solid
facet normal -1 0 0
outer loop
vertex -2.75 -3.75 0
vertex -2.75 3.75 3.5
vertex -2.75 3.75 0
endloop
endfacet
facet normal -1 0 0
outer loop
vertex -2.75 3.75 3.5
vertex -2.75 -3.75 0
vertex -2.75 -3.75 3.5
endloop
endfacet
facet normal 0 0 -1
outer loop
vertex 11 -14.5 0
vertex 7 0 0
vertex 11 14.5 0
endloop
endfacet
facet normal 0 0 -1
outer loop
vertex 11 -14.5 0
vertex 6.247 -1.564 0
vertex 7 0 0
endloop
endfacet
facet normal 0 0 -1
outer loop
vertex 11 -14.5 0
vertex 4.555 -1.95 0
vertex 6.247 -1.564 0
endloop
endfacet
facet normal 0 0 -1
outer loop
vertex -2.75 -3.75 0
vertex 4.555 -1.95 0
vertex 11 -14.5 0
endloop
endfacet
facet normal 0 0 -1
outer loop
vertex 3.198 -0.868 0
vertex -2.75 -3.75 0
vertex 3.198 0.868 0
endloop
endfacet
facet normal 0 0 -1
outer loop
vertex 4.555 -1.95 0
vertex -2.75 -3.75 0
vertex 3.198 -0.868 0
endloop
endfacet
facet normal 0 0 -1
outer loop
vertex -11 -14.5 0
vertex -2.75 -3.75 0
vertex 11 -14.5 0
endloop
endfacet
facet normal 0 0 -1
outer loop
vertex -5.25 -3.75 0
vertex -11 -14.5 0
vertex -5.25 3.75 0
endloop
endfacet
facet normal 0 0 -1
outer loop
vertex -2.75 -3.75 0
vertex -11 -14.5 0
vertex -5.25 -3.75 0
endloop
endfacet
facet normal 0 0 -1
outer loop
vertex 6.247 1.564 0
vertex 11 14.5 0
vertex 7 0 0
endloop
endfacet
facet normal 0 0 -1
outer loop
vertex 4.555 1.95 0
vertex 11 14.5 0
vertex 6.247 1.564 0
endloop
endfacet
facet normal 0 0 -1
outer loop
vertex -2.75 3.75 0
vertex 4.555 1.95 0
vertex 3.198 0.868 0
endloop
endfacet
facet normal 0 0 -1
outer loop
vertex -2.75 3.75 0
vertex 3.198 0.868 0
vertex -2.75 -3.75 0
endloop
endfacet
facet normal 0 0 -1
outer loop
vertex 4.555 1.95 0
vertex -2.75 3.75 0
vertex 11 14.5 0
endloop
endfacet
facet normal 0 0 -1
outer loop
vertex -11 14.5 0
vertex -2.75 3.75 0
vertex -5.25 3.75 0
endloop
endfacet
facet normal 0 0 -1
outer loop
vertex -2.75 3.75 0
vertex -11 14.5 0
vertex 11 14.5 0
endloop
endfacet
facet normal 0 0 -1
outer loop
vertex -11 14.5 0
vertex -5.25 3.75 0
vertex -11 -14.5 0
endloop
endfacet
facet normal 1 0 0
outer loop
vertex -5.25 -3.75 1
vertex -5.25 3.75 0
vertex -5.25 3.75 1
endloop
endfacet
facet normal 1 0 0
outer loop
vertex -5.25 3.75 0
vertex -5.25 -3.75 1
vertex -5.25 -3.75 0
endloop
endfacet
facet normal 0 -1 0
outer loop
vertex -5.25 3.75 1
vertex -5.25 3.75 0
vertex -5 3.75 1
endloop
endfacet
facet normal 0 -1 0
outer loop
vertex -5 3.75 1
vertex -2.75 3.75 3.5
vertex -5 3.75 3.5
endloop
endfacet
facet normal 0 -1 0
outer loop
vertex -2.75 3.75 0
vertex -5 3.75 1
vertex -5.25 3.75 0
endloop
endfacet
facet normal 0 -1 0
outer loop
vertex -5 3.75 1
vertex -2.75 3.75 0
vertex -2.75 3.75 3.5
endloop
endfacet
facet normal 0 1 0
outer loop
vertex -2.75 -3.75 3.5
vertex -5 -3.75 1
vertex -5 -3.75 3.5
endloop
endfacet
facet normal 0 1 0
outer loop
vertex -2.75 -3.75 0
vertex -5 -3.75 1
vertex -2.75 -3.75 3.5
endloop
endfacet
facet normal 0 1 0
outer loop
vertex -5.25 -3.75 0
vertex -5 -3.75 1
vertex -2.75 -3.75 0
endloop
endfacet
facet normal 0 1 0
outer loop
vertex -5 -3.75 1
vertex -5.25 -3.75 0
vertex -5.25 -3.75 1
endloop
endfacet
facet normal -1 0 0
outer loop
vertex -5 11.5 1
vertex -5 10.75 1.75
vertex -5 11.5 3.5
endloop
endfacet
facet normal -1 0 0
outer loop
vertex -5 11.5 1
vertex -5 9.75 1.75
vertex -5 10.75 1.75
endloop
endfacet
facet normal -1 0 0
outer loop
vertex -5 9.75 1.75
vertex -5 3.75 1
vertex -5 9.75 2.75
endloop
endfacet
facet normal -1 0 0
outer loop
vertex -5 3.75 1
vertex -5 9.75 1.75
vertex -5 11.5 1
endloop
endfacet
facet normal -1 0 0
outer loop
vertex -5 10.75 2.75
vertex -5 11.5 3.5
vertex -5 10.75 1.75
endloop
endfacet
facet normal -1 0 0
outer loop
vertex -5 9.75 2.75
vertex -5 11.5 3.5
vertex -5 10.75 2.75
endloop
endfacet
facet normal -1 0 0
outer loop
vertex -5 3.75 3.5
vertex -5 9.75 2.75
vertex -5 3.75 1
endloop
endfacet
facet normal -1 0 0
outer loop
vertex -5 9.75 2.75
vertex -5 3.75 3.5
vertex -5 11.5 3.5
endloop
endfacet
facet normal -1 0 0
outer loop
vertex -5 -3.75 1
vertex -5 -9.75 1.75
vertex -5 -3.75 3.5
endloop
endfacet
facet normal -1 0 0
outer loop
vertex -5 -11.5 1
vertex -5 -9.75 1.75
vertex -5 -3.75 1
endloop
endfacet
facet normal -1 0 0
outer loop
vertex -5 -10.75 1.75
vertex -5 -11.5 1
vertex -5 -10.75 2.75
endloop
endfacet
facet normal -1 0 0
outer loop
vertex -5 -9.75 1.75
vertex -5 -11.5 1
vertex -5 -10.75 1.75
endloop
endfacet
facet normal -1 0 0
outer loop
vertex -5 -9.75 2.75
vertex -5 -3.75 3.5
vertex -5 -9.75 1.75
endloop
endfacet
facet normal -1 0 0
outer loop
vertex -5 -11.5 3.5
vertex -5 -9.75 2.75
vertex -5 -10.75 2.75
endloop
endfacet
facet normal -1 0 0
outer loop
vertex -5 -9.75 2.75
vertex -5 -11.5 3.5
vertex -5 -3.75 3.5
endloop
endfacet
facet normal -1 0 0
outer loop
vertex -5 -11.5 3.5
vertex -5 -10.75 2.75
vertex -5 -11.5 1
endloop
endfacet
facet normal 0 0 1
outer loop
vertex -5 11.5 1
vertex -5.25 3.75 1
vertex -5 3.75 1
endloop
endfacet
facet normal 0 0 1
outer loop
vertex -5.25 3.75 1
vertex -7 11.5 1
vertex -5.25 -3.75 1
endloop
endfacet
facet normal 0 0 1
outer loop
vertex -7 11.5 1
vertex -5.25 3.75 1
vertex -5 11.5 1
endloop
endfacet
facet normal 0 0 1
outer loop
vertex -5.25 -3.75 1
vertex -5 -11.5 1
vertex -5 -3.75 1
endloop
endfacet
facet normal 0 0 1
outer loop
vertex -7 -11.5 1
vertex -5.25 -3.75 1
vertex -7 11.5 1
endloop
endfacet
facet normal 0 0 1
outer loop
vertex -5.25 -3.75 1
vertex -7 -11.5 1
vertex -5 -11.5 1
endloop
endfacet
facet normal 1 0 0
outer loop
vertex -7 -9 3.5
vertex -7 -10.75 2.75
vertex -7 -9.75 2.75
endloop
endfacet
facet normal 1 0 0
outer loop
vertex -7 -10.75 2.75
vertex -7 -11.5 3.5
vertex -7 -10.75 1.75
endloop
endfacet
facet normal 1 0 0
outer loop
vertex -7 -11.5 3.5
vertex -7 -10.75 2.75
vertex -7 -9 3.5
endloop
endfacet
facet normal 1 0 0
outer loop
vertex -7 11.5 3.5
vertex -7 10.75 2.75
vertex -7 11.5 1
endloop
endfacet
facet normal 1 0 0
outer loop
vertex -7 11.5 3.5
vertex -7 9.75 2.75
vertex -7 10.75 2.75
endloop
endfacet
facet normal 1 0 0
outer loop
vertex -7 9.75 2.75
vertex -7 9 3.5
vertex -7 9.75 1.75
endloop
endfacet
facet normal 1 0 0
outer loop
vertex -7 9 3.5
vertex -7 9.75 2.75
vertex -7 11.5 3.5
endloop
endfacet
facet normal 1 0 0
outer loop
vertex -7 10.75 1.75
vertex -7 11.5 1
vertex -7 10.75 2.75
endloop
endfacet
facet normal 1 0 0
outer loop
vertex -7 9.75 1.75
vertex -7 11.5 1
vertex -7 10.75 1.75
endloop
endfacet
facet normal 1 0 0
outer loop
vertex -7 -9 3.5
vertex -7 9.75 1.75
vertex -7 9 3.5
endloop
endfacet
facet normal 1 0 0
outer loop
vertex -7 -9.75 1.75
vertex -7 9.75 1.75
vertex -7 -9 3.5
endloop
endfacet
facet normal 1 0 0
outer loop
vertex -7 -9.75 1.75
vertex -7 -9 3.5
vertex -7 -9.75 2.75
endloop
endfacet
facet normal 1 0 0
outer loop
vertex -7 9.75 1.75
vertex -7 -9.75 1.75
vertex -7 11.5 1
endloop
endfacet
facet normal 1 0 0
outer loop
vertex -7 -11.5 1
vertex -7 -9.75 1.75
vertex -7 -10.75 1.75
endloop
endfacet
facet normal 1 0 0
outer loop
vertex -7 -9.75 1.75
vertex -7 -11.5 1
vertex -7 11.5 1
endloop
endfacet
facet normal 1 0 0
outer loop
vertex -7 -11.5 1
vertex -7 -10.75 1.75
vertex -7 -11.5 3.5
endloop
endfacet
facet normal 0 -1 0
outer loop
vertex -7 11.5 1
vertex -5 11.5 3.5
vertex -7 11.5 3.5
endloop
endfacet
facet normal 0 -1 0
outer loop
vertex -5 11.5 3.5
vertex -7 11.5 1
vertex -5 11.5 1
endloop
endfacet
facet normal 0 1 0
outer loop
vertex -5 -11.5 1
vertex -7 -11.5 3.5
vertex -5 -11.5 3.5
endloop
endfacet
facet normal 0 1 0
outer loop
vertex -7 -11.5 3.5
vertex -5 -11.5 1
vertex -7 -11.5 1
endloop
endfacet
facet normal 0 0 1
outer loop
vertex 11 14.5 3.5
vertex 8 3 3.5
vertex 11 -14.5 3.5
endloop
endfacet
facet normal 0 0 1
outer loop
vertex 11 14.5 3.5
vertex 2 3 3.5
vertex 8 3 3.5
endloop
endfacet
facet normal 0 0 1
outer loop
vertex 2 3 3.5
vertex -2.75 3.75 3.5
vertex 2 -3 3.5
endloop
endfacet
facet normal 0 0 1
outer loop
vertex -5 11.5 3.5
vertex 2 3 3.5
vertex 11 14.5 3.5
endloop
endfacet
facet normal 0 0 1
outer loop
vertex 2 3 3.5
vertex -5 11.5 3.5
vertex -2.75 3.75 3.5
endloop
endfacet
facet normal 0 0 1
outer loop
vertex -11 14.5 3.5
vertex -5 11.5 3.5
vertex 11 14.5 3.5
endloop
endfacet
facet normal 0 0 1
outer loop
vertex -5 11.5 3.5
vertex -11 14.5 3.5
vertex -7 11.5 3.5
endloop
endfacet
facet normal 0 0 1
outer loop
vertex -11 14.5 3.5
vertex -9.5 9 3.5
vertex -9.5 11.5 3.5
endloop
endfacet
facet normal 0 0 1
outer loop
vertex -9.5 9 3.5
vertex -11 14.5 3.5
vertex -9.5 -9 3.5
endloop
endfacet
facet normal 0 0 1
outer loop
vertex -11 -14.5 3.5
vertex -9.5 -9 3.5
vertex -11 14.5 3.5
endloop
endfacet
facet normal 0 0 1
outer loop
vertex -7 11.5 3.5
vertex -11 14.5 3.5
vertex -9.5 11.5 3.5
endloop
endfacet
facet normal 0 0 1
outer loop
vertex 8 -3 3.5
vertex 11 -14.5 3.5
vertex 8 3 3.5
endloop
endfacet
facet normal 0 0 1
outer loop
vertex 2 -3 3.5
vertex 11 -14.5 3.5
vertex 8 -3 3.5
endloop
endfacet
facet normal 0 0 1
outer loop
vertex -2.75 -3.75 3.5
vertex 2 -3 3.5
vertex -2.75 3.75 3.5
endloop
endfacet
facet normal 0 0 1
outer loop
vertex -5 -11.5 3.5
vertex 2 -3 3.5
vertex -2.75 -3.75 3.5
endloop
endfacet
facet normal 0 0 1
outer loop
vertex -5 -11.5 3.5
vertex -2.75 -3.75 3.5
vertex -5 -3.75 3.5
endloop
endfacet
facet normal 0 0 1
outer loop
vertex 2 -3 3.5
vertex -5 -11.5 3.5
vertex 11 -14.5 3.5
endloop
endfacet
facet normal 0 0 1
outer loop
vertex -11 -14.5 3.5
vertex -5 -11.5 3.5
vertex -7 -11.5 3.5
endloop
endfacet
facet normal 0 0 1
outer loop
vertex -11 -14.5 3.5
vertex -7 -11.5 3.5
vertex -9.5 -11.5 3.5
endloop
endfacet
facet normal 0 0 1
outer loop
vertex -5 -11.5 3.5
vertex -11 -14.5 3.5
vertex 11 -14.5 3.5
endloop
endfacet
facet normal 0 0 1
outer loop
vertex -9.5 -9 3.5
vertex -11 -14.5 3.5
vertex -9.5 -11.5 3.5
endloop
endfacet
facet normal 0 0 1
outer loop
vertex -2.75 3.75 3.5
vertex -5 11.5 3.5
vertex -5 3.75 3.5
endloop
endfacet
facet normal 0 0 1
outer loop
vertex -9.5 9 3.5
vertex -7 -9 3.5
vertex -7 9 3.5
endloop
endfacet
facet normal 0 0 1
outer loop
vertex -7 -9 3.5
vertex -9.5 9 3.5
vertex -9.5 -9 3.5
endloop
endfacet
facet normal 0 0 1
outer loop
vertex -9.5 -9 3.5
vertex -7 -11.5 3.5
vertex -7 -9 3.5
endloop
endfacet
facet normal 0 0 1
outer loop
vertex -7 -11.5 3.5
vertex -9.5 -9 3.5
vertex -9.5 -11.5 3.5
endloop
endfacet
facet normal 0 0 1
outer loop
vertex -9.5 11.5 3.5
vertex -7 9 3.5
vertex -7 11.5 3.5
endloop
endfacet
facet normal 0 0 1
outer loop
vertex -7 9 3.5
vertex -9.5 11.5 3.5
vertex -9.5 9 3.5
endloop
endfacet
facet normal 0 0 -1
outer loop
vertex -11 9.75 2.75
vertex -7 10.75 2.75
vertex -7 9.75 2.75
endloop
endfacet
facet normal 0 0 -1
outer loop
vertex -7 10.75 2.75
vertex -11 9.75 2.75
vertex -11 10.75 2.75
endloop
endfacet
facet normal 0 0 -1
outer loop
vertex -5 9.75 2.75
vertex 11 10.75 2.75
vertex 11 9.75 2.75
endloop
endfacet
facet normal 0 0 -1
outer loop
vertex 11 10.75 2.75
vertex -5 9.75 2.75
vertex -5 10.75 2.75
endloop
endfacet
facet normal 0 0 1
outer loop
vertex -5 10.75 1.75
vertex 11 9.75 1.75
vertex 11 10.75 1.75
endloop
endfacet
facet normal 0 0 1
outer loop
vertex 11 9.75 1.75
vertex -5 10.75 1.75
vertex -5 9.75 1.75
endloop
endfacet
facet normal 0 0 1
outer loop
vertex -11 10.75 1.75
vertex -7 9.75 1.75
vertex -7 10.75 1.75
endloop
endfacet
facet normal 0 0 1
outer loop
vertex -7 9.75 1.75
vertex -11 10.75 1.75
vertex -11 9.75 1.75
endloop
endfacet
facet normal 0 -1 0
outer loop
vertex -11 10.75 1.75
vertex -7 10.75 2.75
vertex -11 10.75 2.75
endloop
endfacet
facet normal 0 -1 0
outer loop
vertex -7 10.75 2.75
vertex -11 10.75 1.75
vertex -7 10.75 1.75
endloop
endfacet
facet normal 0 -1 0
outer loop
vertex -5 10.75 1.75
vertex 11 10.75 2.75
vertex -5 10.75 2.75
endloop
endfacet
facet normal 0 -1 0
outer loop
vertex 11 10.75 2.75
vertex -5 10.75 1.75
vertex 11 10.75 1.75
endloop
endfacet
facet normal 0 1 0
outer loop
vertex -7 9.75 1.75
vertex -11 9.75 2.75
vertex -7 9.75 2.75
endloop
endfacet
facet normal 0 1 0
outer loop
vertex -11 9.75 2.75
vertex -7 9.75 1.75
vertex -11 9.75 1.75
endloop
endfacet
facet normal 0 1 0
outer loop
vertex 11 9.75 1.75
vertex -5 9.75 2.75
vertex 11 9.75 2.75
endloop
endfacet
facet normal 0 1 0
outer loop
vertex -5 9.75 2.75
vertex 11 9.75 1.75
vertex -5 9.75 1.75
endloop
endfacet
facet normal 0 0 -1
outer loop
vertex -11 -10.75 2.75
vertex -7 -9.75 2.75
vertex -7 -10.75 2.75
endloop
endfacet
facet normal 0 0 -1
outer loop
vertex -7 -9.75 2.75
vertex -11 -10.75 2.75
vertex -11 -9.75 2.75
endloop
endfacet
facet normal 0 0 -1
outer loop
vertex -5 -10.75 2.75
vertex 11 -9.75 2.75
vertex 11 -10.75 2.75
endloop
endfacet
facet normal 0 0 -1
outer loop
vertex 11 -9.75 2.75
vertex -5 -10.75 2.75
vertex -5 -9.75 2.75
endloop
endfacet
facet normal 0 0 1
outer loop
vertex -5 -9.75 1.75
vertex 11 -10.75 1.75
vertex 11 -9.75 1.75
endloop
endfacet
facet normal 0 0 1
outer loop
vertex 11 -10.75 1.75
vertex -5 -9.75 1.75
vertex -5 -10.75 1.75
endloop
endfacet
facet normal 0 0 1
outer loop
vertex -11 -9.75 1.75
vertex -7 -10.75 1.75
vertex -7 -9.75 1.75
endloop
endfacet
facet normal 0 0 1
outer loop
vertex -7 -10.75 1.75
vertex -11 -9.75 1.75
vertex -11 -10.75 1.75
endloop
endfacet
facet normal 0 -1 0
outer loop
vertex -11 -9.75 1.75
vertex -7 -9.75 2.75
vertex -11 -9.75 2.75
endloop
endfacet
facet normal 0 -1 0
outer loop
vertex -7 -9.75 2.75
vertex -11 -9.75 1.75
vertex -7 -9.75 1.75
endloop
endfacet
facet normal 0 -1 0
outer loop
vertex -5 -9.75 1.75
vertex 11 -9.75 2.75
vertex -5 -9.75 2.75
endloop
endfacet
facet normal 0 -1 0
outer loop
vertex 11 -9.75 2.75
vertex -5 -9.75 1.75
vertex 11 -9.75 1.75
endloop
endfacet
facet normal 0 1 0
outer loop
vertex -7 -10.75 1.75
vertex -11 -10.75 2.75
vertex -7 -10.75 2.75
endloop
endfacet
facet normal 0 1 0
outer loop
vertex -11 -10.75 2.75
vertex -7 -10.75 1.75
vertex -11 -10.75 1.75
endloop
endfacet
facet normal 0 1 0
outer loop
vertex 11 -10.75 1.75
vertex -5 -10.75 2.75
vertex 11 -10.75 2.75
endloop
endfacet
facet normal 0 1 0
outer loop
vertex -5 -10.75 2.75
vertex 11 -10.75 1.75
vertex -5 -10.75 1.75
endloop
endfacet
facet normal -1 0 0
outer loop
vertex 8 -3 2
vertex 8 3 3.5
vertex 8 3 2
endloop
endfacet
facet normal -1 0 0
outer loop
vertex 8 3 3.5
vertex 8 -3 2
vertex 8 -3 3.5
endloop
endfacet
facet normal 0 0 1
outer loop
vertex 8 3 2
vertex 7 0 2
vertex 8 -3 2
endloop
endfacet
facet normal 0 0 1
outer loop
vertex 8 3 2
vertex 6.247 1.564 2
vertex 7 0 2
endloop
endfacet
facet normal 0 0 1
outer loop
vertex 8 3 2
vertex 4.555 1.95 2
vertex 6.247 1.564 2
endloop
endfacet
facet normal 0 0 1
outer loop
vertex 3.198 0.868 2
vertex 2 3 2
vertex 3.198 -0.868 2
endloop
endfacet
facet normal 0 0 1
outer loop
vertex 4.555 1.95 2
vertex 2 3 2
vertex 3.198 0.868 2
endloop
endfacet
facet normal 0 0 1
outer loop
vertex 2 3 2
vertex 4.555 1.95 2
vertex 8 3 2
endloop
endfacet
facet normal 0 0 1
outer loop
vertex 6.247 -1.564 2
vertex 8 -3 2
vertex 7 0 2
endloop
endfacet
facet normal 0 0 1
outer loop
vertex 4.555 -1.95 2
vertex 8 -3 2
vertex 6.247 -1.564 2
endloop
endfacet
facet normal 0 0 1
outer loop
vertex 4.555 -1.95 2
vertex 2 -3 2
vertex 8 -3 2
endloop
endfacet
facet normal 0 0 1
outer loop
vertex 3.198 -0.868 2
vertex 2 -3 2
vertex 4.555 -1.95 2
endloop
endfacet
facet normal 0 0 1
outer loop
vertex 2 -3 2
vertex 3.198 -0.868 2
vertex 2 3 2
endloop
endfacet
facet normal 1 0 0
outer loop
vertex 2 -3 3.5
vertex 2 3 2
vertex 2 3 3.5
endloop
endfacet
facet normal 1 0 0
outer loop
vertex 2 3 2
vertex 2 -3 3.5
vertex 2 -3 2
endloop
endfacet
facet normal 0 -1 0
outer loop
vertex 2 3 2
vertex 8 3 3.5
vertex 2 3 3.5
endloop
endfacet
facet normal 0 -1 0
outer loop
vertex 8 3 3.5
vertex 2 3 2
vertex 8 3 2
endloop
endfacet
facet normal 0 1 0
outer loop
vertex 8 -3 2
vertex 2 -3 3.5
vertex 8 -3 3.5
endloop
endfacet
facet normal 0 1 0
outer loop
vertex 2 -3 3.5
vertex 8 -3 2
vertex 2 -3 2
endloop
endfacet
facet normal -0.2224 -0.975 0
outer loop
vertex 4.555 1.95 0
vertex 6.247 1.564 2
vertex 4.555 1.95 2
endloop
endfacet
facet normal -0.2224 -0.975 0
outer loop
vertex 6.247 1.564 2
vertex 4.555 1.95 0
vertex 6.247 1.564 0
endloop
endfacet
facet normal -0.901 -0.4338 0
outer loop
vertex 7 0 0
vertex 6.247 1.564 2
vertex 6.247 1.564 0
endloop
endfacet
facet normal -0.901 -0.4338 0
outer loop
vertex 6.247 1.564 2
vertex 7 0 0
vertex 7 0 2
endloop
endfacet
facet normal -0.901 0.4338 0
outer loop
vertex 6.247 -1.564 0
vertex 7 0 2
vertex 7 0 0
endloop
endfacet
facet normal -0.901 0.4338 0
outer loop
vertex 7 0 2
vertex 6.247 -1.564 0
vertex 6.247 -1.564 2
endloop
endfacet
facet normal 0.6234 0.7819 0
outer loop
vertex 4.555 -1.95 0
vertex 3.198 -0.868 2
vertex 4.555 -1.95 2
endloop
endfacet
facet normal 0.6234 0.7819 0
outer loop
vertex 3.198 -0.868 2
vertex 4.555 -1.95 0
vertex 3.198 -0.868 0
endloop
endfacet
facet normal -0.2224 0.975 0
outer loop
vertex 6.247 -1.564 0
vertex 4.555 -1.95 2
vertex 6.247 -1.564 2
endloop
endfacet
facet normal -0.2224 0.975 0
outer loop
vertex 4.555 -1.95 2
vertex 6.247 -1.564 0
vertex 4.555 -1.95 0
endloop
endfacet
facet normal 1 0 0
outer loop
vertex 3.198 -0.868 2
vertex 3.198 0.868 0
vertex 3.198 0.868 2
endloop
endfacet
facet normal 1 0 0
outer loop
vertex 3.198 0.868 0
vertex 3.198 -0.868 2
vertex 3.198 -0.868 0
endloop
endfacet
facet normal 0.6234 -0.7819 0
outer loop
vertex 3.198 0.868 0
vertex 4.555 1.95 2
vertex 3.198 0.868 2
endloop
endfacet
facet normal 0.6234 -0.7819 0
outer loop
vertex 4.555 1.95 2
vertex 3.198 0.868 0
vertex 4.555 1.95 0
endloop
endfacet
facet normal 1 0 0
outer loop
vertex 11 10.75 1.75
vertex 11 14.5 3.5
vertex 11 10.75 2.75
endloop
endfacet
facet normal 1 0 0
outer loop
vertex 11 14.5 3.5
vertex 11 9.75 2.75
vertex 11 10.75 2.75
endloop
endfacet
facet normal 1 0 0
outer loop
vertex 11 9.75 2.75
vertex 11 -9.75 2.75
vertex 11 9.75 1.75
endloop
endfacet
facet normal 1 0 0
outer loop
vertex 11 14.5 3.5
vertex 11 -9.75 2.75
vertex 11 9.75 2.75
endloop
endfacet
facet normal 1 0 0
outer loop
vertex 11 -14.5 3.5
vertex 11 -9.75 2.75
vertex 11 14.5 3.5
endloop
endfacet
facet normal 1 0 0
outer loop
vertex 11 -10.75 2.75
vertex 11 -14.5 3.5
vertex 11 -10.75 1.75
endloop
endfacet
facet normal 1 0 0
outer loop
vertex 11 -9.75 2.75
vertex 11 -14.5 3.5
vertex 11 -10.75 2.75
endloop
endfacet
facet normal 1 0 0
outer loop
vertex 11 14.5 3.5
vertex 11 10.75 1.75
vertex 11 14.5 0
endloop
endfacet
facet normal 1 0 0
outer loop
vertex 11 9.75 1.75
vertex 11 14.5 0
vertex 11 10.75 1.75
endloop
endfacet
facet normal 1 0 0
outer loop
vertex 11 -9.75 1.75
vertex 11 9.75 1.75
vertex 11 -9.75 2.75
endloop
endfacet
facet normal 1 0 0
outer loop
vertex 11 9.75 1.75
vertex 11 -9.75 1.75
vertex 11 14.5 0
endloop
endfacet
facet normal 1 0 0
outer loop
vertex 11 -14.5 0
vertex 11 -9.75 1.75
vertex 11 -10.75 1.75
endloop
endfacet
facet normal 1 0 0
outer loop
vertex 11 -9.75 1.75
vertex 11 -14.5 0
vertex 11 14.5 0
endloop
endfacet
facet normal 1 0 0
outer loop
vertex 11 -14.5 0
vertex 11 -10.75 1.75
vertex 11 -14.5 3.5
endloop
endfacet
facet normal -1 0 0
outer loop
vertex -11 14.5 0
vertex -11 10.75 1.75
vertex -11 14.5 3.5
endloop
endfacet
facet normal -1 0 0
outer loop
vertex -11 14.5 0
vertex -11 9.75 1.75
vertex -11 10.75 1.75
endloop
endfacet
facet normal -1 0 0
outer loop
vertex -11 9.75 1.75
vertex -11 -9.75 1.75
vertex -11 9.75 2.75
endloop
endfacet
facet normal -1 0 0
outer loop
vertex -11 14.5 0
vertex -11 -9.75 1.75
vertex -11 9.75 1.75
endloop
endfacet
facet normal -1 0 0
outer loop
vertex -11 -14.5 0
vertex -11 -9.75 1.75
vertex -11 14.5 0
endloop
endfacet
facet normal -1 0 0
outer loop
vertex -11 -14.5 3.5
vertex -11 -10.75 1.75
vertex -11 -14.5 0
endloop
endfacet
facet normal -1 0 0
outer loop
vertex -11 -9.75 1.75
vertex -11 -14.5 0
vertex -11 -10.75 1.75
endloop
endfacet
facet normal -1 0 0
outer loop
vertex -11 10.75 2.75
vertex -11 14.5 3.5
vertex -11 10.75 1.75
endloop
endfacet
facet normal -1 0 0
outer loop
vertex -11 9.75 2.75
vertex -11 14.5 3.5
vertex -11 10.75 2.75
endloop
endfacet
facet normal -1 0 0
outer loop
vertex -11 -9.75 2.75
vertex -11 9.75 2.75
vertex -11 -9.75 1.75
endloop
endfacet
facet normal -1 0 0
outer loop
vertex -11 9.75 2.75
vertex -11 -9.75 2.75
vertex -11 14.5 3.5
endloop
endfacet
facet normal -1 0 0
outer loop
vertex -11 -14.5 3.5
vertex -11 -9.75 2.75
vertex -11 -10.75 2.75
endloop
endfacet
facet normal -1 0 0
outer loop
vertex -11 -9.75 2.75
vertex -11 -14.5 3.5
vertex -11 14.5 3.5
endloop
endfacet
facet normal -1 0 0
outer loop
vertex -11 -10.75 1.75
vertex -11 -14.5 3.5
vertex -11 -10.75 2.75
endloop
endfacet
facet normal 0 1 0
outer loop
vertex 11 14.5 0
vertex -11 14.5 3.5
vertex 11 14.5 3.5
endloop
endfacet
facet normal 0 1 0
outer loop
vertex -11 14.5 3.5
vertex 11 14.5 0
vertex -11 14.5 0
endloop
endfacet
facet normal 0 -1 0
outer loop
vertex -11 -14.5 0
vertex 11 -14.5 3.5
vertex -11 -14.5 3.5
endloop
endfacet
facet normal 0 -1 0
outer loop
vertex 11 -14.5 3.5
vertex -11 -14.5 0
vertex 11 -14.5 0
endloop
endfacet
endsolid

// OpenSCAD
// Generated by SolidPython 1.0.2 on 2020-11-15 21:51:06


difference() {
	translate(v = [0, 0, 1.7500000000]) {
		cube(center = true, size = [22, 29, 3.5000000000]);
	}
	translate(v = [-4, 0, 0]) {
		union() {
			translate(v = [0, 0, 3.5000000000]) {
				cube(center = true, size = [2.5000000000, 7.5000000000, 7]);
			}
			translate(v = [0, 0, 1]) {
				translate(v = [-2, 0, 0]) {
					translate(v = [0, 0, 3.7500000000]) {
						cube(center = true, size = [2, 23, 7.5000000000]);
					}
				}
			}
			translate(v = [-4.2500000000, 0, 0]) {
				translate(v = [0, 0, 3.5000000000]) {
					translate(v = [0, 10.2500000000, 0]) {
						translate(v = [0, 0, 2.5000000000]) {
							cube(center = true, size = [2.5000000000, 2.5000000000, 5]);
						}
					}
				}
			}
			translate(v = [-4.2500000000, 0, 0]) {
				translate(v = [0, 0, 3.5000000000]) {
					translate(v = [0, -10.2500000000, 0]) {
						translate(v = [0, 0, 2.5000000000]) {
							cube(center = true, size = [2.5000000000, 2.5000000000, 5]);
						}
					}
				}
			}
			translate(v = [4, 0, 0]) {
				translate(v = [0, 0, 2.2500000000]) {
					translate(v = [0, 10.2500000000, 0]) {
						cube(center = true, size = [29, 1, 1]);
					}
				}
			}
			translate(v = [4, 0, 0]) {
				translate(v = [0, 0, 2.2500000000]) {
					translate(v = [0, -10.2500000000, 0]) {
						cube(center = true, size = [29, 1, 1]);
					}
				}
			}
		}
	}
	translate(v = [0, 0, -2]) {
		translate(v = [5, 0, 0]) {
			union() {
				translate(v = [0, 0, -5]) {
					translate(v = [0, 0, 10.5000000000]) {
						cube(center = true, size = [6, 6, 3]);
					}
				}
				translate(v = [0, 0, 2.5000000000]) {
					cylinder(center = true, h = 5, r = 2);
				}
			}
		}
	}
}
/***********************************************
*********      SolidPython code:      **********
************************************************
 
#libraries
from solid import *
from solid.utils import *

#3d designi
block = up(1.75)(cube([22,29,3.5],True))


#arduino board
usbhole = up(3.5)(cube([2.5,7.5,7],True))
board = up(3.75)(cube([2,23,7.5],True))
dupont = up(2.5)(cube([2.5,2.5,5],True))
pinhole = cube([29,1,1],True)

arduino = (usbhole) \
+ up(1)(left(2)(board)) \
+ left(4.25)(up(3.5)(forward((23/2)-1.25)(dupont))) \
+ left(4.25)(up(3.5)(back((23/2)-1.25)(dupont))) \
+ right(4)(up(2.25)(forward((23/2)-1.25)(pinhole))) \
+ right(4)(up(2.25)(back((23/2)-1.25)(pinhole)))

#button
square = up(10.5)(cube([6,6,3],True))
cylinderbutton = up(2.5)(cylinder(r=2,h=5,center=True))
button = down(5)(square) + cylinderbutton
# d = cube(1) + right(5)(sphere(5)) - cylinder(r=2, h=6)

d = block - left(4)(arduino) - down(2)(right(5)(button))

#render
scad_render_to_file(d, 'out_file.scad')
# scad_render_to_file(pinhole, 'out_file.scad')
# scad_render_to_file(arduino, 'out_file.scad')
# scad_render_to_file(dupont, 'out_file.scad')
# scad_render_to_file(button, 'out_file.scad')
# scad_render_to_file(block, 'out_file.scad')
 
 
************************************************/
